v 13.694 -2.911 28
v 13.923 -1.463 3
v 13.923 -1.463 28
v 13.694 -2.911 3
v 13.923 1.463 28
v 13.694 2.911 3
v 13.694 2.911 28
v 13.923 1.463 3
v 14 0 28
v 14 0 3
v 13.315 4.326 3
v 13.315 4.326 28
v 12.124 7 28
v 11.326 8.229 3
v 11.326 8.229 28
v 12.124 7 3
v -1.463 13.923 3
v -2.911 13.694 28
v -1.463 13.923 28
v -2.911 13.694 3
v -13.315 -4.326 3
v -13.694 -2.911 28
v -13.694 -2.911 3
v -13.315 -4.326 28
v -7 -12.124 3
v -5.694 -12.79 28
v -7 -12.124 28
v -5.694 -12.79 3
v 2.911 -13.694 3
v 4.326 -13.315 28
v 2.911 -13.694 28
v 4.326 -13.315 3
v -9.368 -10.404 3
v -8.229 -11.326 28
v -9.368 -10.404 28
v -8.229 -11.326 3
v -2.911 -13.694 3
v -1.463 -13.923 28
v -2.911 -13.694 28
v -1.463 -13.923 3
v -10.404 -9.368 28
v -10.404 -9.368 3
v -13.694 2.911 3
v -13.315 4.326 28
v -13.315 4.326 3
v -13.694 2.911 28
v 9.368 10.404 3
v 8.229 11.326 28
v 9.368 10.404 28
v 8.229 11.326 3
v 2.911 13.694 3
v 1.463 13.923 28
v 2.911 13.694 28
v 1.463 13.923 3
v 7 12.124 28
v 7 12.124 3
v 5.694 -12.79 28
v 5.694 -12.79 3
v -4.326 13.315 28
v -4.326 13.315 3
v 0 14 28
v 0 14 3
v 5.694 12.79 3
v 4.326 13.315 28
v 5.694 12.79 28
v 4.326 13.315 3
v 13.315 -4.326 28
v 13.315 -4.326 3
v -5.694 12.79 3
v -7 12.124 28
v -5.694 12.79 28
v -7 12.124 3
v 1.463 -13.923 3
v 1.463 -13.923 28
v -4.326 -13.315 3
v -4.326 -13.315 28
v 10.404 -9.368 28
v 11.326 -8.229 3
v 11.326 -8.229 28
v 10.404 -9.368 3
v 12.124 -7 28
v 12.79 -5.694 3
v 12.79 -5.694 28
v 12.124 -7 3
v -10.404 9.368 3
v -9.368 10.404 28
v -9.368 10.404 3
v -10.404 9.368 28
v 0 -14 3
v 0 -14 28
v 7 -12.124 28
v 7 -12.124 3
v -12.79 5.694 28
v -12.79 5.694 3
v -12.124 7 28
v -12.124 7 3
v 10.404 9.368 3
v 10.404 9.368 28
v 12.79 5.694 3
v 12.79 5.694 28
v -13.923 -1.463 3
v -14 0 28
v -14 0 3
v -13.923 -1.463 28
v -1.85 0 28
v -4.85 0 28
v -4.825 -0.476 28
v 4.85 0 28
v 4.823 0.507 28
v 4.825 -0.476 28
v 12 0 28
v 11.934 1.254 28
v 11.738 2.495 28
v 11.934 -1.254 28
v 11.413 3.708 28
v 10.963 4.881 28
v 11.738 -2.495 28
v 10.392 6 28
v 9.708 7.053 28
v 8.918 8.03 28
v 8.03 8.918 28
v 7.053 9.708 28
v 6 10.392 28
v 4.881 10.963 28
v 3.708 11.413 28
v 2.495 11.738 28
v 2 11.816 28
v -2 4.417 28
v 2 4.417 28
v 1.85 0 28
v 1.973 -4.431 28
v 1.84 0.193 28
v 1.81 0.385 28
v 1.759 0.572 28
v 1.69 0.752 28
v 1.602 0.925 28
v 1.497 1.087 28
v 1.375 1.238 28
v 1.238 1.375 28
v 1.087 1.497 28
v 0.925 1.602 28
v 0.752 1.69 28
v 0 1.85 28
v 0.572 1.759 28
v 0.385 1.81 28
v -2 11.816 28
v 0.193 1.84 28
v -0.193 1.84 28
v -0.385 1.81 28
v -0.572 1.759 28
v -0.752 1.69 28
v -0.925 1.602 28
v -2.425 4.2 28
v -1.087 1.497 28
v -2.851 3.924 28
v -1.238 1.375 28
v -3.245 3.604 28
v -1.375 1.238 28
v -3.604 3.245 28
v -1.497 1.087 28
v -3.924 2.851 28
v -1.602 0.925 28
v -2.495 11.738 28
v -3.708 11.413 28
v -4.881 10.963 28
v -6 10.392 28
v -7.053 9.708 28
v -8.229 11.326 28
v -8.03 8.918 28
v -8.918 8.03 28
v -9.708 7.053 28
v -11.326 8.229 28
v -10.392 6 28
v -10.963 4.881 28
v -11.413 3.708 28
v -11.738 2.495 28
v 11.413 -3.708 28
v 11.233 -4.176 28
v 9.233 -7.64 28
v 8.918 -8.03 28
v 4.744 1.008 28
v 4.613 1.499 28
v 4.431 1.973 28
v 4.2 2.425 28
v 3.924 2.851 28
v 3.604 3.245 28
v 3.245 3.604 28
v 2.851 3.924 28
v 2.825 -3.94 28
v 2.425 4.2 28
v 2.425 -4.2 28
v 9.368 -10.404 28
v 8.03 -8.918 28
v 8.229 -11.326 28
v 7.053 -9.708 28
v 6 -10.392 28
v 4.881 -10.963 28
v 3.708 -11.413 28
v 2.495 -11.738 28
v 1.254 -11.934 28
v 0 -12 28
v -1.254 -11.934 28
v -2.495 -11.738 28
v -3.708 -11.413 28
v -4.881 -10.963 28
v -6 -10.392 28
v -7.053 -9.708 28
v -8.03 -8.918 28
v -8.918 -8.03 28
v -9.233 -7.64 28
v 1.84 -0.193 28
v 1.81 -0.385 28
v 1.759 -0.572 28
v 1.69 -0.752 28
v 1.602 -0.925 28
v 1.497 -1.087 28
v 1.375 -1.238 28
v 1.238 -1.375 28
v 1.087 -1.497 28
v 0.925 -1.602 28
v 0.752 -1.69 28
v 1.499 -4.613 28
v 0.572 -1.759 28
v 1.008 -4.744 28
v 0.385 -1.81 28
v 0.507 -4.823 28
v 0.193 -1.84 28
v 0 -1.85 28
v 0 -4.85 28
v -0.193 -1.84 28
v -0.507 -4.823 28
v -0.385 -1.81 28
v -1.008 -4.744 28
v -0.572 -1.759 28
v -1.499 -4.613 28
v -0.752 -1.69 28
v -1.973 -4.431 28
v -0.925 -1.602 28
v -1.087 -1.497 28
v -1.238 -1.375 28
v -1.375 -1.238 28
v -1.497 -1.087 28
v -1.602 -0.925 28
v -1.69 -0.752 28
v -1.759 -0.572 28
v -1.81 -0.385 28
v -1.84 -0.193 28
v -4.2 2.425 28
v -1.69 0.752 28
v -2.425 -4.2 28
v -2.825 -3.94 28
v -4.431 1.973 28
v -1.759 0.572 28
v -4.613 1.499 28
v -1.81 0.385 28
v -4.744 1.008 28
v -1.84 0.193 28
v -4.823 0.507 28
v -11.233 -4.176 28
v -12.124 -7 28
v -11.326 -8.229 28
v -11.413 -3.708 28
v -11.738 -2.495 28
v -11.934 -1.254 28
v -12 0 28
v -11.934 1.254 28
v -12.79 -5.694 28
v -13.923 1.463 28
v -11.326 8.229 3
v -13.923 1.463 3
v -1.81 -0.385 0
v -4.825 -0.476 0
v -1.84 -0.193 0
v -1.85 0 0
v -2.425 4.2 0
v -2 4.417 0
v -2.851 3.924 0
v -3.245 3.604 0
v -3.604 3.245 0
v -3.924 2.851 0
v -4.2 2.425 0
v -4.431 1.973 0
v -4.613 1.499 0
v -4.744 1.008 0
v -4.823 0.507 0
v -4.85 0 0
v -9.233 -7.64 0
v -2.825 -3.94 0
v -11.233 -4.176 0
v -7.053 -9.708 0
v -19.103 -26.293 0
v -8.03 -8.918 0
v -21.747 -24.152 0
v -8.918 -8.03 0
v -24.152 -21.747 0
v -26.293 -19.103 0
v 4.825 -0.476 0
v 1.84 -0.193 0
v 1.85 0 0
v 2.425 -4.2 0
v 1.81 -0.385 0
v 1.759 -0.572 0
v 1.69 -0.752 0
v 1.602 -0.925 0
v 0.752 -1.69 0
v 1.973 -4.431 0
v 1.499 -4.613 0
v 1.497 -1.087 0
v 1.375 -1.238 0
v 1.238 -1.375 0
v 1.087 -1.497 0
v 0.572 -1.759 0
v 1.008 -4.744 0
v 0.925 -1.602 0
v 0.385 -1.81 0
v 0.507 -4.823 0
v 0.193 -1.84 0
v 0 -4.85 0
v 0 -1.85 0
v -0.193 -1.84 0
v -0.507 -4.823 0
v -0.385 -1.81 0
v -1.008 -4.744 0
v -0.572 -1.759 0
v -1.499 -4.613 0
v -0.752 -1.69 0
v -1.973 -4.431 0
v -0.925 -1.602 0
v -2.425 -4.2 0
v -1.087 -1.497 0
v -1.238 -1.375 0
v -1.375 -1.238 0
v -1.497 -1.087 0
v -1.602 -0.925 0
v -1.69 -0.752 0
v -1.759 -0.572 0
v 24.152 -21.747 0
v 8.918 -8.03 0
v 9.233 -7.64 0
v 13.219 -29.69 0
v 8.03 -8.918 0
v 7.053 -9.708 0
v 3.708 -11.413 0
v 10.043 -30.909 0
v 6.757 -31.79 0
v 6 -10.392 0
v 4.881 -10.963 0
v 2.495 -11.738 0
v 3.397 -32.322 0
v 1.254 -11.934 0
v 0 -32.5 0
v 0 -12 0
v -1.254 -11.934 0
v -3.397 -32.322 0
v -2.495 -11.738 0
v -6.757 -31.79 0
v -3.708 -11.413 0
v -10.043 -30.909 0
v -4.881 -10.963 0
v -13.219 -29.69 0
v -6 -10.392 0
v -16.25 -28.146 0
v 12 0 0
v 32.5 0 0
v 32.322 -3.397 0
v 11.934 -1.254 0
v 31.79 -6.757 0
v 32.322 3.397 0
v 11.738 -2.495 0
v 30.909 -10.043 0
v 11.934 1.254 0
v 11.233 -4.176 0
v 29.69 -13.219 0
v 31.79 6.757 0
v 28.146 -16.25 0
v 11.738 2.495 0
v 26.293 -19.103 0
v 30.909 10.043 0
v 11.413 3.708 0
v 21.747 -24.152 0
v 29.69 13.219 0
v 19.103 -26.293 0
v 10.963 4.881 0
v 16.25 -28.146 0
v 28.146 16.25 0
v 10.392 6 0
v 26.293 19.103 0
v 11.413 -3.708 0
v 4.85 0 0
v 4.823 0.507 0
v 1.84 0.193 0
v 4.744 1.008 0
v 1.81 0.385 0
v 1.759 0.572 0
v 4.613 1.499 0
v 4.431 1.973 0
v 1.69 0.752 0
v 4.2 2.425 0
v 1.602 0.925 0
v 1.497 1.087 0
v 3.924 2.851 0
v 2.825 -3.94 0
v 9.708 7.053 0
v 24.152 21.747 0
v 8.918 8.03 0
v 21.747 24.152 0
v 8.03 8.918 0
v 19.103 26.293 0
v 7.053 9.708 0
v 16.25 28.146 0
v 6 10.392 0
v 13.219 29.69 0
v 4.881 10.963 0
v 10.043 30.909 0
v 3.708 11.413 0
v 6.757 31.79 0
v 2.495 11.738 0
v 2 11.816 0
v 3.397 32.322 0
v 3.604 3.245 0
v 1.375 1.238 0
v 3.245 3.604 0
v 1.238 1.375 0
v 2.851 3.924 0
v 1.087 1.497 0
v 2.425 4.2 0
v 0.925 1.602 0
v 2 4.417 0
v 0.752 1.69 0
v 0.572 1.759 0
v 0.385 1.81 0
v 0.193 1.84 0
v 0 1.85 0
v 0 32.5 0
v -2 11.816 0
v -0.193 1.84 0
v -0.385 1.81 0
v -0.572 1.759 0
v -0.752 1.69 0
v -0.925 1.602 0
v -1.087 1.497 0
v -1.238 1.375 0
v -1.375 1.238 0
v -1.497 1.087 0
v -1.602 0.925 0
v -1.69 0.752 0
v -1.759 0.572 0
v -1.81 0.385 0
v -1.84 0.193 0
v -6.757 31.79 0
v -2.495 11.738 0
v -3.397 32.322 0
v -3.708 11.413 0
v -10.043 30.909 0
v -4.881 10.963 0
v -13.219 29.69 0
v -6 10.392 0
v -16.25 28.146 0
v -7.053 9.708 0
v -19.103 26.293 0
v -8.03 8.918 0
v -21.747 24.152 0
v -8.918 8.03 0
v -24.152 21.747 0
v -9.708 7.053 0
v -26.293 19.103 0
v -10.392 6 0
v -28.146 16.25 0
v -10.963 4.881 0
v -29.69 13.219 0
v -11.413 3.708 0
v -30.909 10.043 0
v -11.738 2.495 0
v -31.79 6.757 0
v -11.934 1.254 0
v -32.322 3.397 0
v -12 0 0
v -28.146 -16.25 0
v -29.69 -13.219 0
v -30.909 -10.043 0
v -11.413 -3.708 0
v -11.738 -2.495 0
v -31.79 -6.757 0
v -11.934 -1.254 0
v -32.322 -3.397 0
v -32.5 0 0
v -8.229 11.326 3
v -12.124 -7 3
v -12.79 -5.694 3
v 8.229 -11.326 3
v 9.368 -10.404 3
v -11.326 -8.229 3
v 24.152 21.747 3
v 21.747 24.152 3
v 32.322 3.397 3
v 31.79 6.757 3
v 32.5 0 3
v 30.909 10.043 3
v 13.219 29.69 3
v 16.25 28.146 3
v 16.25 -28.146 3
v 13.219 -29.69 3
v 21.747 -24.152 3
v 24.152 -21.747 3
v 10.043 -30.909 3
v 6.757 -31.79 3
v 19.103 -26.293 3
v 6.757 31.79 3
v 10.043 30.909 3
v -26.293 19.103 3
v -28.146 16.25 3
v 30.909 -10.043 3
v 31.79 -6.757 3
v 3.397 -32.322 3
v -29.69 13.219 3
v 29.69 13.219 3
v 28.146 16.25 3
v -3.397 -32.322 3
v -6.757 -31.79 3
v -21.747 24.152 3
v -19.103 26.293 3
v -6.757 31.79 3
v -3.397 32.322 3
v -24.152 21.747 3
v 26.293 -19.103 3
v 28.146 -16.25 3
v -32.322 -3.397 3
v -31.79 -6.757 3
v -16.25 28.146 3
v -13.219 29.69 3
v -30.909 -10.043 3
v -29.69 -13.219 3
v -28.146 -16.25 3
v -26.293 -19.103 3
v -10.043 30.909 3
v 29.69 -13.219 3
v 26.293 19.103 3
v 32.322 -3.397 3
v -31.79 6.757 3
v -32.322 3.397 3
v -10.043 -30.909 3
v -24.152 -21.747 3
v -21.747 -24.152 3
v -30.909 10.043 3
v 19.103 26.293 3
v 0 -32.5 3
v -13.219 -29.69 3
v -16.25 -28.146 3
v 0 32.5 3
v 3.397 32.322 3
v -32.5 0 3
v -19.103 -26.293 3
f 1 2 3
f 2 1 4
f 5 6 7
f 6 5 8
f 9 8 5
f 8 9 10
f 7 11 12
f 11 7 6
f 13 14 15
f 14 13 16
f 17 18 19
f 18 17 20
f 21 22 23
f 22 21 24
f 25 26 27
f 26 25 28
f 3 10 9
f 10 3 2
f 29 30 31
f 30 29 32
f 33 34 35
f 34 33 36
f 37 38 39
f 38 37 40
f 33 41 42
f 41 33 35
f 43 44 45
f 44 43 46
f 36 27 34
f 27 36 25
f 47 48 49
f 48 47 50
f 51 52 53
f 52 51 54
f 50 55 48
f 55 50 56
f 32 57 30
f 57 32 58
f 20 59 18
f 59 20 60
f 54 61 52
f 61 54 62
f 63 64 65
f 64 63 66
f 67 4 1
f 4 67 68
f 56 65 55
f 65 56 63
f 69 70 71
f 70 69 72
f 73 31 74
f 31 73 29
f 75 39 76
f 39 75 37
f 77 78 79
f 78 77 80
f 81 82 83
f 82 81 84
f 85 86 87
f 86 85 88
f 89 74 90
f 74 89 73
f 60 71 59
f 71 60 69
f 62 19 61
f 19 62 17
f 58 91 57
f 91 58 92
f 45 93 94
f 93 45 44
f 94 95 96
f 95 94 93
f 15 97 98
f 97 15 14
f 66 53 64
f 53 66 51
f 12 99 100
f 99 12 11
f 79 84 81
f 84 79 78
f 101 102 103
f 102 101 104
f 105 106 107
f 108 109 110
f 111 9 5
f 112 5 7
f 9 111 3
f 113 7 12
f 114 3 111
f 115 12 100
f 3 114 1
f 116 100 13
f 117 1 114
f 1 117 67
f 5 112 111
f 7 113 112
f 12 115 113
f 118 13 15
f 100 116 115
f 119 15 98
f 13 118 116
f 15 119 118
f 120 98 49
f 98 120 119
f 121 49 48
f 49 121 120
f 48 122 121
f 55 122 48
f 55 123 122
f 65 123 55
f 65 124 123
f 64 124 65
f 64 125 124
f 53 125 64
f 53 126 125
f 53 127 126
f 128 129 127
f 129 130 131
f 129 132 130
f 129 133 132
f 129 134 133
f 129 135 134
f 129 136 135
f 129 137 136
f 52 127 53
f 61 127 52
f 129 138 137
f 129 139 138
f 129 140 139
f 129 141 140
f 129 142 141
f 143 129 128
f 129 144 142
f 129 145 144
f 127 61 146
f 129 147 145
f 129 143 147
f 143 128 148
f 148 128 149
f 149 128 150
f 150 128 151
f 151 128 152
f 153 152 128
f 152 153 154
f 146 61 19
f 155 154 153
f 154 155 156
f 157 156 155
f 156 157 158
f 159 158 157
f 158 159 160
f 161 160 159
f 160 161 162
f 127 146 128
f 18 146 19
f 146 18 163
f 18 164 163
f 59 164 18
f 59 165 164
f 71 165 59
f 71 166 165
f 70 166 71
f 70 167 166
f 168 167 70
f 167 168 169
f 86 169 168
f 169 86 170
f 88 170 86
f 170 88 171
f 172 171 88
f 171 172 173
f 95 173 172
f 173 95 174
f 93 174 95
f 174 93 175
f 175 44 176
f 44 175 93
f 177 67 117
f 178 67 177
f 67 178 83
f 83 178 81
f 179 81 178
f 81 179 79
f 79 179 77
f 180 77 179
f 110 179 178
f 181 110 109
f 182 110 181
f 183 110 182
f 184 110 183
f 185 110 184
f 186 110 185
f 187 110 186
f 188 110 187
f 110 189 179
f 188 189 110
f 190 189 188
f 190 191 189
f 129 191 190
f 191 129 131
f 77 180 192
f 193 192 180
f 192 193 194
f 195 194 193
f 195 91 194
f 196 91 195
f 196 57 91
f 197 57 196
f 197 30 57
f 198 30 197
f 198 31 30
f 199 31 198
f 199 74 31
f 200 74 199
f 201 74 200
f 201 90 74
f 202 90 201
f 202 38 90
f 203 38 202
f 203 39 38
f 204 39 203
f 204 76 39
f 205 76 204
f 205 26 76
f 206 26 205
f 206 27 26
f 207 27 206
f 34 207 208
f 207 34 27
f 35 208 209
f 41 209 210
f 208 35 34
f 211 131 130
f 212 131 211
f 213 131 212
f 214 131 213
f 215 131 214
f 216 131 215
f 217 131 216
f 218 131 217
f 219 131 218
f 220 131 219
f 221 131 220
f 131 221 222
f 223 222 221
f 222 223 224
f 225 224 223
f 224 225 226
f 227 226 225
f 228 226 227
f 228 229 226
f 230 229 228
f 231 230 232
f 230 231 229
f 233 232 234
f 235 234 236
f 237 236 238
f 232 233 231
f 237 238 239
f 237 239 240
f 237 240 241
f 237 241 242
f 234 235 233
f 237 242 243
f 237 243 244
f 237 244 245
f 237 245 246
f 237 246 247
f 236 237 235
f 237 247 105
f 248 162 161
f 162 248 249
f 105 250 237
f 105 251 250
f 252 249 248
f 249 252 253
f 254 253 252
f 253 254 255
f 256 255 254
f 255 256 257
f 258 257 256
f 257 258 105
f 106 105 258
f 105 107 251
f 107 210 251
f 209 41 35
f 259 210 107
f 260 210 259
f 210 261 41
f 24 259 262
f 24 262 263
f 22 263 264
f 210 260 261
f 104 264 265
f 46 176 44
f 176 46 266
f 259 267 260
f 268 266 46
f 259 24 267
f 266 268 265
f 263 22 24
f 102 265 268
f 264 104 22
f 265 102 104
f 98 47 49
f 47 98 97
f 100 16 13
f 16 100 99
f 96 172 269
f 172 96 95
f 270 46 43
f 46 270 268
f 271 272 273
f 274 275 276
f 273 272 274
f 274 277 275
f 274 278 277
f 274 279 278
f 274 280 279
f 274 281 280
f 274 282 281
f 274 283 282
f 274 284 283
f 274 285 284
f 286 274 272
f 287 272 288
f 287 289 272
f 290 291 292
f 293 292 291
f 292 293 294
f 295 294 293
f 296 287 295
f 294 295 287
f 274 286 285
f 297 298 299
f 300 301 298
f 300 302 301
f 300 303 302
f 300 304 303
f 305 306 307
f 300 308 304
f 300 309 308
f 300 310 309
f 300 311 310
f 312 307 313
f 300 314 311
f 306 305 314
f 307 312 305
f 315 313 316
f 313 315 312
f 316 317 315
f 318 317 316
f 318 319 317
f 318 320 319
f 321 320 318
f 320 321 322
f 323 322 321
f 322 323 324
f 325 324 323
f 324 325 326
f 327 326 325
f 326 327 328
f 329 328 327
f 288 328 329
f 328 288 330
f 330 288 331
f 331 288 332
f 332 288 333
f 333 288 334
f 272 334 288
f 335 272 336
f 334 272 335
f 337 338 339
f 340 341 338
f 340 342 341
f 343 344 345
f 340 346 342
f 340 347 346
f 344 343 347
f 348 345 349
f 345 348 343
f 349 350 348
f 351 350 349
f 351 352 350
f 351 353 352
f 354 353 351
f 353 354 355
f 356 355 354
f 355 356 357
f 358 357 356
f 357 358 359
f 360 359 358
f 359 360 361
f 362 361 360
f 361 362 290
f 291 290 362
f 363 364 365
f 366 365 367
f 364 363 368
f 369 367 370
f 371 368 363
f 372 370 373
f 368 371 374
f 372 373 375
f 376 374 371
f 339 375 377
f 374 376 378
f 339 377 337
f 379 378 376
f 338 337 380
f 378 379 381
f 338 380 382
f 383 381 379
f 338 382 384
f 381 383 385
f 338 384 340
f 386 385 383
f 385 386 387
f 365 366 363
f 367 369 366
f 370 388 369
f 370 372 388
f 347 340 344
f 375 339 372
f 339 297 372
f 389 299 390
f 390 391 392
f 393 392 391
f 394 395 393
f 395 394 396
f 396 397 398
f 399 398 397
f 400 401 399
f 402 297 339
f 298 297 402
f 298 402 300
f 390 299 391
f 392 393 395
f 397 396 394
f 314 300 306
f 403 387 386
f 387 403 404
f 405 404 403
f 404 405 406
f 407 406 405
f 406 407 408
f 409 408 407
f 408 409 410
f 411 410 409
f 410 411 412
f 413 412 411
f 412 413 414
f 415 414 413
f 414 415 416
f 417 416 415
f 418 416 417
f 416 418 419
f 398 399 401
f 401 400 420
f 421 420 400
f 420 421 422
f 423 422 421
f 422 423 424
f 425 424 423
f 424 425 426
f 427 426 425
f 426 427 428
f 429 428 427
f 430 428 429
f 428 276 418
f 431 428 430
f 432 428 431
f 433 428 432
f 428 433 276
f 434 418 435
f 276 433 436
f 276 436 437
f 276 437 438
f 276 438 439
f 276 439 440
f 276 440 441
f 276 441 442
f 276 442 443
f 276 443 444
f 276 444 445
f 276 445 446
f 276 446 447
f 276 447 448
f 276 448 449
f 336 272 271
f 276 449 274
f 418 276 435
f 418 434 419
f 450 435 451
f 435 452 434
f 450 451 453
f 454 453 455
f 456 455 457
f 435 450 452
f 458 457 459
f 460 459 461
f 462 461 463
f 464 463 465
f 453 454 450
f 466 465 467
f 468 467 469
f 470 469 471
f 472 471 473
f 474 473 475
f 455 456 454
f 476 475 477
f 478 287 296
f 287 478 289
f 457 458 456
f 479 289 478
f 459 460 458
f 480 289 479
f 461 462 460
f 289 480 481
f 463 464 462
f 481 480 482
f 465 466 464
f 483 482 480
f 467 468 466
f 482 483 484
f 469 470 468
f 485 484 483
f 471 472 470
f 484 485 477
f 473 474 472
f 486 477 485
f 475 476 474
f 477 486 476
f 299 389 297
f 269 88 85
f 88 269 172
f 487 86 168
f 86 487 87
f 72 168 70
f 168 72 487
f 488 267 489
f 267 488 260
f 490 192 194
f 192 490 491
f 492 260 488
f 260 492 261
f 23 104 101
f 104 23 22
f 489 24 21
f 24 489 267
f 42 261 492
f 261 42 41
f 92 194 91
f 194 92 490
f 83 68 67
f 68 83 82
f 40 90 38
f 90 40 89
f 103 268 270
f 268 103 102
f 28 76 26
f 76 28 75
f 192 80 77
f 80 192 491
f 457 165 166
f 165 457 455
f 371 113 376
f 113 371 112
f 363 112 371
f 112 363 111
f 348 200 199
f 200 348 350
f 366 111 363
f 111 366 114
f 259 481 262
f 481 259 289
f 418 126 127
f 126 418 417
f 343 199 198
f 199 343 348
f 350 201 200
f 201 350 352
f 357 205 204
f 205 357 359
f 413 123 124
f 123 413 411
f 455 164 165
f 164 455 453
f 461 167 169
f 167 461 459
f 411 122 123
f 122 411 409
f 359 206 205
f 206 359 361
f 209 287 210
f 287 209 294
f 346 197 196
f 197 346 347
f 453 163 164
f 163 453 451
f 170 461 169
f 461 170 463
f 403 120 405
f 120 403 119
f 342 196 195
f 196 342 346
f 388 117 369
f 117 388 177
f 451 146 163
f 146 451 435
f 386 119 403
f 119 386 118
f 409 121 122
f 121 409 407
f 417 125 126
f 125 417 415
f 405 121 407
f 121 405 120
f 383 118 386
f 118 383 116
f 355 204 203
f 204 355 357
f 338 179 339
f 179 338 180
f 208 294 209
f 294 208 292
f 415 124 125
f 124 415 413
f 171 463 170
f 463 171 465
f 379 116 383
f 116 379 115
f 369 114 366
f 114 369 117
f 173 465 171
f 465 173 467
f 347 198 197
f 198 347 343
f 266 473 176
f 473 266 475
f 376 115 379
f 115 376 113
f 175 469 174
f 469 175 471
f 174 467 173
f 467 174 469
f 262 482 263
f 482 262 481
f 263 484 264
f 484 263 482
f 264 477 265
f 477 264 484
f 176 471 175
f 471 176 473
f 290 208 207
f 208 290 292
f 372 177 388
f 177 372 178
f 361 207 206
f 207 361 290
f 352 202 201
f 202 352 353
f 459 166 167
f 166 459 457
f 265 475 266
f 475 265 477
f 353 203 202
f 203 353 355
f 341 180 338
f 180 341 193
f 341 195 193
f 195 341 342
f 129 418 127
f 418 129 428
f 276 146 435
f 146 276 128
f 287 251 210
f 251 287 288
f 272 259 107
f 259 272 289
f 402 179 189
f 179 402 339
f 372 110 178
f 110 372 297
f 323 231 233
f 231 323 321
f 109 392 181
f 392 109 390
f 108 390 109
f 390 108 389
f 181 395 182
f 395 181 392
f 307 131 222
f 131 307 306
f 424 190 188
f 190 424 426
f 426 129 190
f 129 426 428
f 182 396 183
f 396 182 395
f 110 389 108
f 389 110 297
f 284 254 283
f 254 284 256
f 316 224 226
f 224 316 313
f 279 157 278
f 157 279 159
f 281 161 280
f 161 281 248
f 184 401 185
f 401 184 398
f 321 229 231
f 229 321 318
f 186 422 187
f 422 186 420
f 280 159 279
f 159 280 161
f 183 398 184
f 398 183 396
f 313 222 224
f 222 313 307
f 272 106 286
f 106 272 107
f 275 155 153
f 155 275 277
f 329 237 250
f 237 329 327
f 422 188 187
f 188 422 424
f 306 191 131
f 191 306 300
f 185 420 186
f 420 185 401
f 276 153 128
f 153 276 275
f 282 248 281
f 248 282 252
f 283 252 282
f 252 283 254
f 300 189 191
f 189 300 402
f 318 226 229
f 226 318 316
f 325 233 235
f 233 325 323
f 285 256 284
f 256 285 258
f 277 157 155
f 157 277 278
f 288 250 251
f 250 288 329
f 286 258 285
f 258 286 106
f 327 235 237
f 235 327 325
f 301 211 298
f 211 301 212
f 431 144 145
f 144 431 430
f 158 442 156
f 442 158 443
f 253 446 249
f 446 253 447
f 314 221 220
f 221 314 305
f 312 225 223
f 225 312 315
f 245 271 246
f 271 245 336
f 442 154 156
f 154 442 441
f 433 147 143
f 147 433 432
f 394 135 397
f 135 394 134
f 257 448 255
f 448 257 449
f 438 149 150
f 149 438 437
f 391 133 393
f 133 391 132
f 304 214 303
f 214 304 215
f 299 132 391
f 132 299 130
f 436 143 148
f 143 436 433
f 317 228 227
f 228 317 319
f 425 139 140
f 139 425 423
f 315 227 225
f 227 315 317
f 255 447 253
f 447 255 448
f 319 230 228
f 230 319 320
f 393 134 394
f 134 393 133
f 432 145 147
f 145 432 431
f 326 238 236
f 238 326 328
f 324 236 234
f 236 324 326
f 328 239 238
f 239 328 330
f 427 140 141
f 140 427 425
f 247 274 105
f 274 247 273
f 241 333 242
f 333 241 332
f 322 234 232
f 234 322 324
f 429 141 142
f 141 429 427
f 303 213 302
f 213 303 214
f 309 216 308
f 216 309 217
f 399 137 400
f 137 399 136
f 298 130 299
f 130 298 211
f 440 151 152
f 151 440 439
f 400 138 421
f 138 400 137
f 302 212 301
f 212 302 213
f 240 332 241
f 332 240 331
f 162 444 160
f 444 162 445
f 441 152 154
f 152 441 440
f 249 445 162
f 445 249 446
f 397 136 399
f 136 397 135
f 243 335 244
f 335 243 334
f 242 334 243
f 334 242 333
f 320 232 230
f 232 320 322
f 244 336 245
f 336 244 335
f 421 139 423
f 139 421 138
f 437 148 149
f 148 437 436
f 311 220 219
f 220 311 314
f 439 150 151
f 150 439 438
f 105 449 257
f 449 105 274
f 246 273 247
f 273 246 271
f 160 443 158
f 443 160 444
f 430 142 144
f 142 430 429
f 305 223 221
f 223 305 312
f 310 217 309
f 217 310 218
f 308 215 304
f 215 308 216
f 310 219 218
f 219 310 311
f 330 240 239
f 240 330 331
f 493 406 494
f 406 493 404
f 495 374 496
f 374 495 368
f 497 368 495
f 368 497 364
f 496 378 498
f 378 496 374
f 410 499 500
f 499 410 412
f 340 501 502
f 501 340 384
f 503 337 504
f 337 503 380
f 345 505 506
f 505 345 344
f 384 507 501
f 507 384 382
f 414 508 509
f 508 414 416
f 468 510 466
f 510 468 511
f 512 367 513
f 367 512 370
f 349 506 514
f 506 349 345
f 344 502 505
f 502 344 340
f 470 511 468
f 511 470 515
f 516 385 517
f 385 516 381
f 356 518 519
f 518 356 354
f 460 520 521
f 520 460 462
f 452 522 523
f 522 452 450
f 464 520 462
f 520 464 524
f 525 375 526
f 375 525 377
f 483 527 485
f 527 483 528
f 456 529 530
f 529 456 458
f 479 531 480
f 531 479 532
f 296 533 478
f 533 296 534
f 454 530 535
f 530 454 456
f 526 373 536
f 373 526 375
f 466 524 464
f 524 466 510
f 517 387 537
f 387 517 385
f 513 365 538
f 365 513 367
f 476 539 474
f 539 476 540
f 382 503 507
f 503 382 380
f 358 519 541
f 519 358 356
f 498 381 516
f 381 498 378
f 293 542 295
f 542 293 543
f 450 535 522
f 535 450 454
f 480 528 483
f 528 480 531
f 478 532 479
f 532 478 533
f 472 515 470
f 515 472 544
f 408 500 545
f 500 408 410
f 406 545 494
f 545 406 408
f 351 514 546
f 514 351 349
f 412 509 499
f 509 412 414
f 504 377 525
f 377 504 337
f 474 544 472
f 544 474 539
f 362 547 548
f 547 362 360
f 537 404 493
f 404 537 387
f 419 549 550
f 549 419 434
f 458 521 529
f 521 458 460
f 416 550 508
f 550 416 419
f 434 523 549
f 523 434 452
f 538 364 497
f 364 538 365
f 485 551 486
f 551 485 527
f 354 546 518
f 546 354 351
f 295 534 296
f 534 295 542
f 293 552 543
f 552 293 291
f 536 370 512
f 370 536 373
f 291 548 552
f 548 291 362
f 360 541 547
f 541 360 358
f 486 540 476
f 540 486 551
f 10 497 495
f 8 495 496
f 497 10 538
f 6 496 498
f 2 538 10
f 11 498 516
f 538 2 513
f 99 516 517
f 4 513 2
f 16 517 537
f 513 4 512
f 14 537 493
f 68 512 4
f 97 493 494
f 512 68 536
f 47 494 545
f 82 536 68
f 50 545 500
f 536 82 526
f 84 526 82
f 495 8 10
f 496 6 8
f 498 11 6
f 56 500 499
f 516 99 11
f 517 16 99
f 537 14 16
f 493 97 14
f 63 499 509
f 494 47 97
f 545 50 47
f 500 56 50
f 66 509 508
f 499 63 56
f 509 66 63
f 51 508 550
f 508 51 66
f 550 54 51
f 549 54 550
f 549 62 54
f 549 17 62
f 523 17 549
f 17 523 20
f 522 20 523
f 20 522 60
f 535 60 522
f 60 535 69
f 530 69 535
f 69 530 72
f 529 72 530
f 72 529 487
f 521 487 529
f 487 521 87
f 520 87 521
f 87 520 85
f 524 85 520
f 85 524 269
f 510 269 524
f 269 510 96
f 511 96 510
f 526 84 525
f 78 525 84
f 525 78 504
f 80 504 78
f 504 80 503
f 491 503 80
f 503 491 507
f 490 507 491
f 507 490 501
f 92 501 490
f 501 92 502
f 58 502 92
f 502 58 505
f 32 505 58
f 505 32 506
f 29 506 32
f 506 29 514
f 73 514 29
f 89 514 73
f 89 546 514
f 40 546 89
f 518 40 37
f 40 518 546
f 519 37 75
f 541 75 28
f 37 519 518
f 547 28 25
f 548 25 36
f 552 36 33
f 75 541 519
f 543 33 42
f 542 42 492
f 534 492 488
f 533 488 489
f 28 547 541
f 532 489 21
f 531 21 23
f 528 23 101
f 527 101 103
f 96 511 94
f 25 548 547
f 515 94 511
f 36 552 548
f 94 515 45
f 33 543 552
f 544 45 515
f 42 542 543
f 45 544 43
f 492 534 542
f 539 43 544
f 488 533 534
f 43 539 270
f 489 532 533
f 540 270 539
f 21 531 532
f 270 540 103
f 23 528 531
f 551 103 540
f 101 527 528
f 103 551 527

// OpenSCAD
$fn=60+0;   // +0 so it's ignored by customizer

// Select part
part = "mount"; // [mount:Mount,cap:Mount cap]
screw_hole_diameter = 3.7;
transformer_height = 50;
transformer_inner_diameter = 28;
mount_wall_thickness = 2;
pedestal_diameter = 65;
pedestal_height = 3;
number_of_spokes = 3; // [2:16]
cap_thickness = 3;
cap_diameter = 37;
nut_outer_diameter = 6.2;
nut_height = 3.1;

if(part=="mount") {
    toroid_transformer_holder(
        spokes=number_of_spokes,
        h=transformer_height,
        ow=mount_wall_thickness,
        od=transformer_inner_diameter,
        base_h=pedestal_height,
        base_d=pedestal_diameter,
        hole_d=screw_hole_diameter
    );
} else if (part=="cap") {
    toroid_cap(
        cd=cap_diameter,
        ch=cap_thickness,
        ow=mount_wall_thickness,
        od=transformer_inner_diameter,
        h=transformer_height,
        hd=screw_hole_diameter
    );
}

module toroid_cap(cd=37,ch=3,ow=2,od=28, h=50,hd=4) {
    difference() {
        union() {
            cylinder(d = cd, h=ch);
            translate([0, 0, ch])
                cylinder(d=od, h = h/2);
        }
        union() {
            cylinder(d= od-ow*2, h=h/2-nut_height-0.2);
            // nut hole
            translate([0,0,h/2-nut_height]) // bridge to print w/o support, to drill
                cylinder(d=nut_outer_diameter+0.2, h=nut_height, $fn=6);
            // bolt hole
            translate([0,0,h/2+0.2])
                cylinder(d = hd, h=22);
        }
    }
}

module toroid_transformer_holder(h = 37, od = 31, ow = 1.5, iw=3, hole_d=3, spokes=3, base_h=3, base_d=70 )
{
    spoke_deg = 360/spokes;
    difference() {
        union() {
            cylinder(d = hole_d+iw*2, h = h/2+base_h);
            difference() {
                cylinder(d = od, h = h/2+base_h);
                translate([0,0,-.5]) cylinder(d = od-ow*2, h = h+base_h+1);  // +1 to make it look nicer on preview
            }
            intersection() {
                for(a=[0:spokes-1])
                {
                    rotate([0,0,a*spoke_deg]) translate([0,od/4,(h/2+base_h)/2]) cube([ow*2,od/2,h/2+base_h], true);
                }
                cylinder(d = od, h = h+base_h);
            }
        }
        translate([0,0,-.5]) cylinder(d = hole_d, h = h+base_h+1);
    }
    difference() {
        cylinder(h = base_h, d = base_d);
        cylinder(h = base_h, d = od);
    }

}
